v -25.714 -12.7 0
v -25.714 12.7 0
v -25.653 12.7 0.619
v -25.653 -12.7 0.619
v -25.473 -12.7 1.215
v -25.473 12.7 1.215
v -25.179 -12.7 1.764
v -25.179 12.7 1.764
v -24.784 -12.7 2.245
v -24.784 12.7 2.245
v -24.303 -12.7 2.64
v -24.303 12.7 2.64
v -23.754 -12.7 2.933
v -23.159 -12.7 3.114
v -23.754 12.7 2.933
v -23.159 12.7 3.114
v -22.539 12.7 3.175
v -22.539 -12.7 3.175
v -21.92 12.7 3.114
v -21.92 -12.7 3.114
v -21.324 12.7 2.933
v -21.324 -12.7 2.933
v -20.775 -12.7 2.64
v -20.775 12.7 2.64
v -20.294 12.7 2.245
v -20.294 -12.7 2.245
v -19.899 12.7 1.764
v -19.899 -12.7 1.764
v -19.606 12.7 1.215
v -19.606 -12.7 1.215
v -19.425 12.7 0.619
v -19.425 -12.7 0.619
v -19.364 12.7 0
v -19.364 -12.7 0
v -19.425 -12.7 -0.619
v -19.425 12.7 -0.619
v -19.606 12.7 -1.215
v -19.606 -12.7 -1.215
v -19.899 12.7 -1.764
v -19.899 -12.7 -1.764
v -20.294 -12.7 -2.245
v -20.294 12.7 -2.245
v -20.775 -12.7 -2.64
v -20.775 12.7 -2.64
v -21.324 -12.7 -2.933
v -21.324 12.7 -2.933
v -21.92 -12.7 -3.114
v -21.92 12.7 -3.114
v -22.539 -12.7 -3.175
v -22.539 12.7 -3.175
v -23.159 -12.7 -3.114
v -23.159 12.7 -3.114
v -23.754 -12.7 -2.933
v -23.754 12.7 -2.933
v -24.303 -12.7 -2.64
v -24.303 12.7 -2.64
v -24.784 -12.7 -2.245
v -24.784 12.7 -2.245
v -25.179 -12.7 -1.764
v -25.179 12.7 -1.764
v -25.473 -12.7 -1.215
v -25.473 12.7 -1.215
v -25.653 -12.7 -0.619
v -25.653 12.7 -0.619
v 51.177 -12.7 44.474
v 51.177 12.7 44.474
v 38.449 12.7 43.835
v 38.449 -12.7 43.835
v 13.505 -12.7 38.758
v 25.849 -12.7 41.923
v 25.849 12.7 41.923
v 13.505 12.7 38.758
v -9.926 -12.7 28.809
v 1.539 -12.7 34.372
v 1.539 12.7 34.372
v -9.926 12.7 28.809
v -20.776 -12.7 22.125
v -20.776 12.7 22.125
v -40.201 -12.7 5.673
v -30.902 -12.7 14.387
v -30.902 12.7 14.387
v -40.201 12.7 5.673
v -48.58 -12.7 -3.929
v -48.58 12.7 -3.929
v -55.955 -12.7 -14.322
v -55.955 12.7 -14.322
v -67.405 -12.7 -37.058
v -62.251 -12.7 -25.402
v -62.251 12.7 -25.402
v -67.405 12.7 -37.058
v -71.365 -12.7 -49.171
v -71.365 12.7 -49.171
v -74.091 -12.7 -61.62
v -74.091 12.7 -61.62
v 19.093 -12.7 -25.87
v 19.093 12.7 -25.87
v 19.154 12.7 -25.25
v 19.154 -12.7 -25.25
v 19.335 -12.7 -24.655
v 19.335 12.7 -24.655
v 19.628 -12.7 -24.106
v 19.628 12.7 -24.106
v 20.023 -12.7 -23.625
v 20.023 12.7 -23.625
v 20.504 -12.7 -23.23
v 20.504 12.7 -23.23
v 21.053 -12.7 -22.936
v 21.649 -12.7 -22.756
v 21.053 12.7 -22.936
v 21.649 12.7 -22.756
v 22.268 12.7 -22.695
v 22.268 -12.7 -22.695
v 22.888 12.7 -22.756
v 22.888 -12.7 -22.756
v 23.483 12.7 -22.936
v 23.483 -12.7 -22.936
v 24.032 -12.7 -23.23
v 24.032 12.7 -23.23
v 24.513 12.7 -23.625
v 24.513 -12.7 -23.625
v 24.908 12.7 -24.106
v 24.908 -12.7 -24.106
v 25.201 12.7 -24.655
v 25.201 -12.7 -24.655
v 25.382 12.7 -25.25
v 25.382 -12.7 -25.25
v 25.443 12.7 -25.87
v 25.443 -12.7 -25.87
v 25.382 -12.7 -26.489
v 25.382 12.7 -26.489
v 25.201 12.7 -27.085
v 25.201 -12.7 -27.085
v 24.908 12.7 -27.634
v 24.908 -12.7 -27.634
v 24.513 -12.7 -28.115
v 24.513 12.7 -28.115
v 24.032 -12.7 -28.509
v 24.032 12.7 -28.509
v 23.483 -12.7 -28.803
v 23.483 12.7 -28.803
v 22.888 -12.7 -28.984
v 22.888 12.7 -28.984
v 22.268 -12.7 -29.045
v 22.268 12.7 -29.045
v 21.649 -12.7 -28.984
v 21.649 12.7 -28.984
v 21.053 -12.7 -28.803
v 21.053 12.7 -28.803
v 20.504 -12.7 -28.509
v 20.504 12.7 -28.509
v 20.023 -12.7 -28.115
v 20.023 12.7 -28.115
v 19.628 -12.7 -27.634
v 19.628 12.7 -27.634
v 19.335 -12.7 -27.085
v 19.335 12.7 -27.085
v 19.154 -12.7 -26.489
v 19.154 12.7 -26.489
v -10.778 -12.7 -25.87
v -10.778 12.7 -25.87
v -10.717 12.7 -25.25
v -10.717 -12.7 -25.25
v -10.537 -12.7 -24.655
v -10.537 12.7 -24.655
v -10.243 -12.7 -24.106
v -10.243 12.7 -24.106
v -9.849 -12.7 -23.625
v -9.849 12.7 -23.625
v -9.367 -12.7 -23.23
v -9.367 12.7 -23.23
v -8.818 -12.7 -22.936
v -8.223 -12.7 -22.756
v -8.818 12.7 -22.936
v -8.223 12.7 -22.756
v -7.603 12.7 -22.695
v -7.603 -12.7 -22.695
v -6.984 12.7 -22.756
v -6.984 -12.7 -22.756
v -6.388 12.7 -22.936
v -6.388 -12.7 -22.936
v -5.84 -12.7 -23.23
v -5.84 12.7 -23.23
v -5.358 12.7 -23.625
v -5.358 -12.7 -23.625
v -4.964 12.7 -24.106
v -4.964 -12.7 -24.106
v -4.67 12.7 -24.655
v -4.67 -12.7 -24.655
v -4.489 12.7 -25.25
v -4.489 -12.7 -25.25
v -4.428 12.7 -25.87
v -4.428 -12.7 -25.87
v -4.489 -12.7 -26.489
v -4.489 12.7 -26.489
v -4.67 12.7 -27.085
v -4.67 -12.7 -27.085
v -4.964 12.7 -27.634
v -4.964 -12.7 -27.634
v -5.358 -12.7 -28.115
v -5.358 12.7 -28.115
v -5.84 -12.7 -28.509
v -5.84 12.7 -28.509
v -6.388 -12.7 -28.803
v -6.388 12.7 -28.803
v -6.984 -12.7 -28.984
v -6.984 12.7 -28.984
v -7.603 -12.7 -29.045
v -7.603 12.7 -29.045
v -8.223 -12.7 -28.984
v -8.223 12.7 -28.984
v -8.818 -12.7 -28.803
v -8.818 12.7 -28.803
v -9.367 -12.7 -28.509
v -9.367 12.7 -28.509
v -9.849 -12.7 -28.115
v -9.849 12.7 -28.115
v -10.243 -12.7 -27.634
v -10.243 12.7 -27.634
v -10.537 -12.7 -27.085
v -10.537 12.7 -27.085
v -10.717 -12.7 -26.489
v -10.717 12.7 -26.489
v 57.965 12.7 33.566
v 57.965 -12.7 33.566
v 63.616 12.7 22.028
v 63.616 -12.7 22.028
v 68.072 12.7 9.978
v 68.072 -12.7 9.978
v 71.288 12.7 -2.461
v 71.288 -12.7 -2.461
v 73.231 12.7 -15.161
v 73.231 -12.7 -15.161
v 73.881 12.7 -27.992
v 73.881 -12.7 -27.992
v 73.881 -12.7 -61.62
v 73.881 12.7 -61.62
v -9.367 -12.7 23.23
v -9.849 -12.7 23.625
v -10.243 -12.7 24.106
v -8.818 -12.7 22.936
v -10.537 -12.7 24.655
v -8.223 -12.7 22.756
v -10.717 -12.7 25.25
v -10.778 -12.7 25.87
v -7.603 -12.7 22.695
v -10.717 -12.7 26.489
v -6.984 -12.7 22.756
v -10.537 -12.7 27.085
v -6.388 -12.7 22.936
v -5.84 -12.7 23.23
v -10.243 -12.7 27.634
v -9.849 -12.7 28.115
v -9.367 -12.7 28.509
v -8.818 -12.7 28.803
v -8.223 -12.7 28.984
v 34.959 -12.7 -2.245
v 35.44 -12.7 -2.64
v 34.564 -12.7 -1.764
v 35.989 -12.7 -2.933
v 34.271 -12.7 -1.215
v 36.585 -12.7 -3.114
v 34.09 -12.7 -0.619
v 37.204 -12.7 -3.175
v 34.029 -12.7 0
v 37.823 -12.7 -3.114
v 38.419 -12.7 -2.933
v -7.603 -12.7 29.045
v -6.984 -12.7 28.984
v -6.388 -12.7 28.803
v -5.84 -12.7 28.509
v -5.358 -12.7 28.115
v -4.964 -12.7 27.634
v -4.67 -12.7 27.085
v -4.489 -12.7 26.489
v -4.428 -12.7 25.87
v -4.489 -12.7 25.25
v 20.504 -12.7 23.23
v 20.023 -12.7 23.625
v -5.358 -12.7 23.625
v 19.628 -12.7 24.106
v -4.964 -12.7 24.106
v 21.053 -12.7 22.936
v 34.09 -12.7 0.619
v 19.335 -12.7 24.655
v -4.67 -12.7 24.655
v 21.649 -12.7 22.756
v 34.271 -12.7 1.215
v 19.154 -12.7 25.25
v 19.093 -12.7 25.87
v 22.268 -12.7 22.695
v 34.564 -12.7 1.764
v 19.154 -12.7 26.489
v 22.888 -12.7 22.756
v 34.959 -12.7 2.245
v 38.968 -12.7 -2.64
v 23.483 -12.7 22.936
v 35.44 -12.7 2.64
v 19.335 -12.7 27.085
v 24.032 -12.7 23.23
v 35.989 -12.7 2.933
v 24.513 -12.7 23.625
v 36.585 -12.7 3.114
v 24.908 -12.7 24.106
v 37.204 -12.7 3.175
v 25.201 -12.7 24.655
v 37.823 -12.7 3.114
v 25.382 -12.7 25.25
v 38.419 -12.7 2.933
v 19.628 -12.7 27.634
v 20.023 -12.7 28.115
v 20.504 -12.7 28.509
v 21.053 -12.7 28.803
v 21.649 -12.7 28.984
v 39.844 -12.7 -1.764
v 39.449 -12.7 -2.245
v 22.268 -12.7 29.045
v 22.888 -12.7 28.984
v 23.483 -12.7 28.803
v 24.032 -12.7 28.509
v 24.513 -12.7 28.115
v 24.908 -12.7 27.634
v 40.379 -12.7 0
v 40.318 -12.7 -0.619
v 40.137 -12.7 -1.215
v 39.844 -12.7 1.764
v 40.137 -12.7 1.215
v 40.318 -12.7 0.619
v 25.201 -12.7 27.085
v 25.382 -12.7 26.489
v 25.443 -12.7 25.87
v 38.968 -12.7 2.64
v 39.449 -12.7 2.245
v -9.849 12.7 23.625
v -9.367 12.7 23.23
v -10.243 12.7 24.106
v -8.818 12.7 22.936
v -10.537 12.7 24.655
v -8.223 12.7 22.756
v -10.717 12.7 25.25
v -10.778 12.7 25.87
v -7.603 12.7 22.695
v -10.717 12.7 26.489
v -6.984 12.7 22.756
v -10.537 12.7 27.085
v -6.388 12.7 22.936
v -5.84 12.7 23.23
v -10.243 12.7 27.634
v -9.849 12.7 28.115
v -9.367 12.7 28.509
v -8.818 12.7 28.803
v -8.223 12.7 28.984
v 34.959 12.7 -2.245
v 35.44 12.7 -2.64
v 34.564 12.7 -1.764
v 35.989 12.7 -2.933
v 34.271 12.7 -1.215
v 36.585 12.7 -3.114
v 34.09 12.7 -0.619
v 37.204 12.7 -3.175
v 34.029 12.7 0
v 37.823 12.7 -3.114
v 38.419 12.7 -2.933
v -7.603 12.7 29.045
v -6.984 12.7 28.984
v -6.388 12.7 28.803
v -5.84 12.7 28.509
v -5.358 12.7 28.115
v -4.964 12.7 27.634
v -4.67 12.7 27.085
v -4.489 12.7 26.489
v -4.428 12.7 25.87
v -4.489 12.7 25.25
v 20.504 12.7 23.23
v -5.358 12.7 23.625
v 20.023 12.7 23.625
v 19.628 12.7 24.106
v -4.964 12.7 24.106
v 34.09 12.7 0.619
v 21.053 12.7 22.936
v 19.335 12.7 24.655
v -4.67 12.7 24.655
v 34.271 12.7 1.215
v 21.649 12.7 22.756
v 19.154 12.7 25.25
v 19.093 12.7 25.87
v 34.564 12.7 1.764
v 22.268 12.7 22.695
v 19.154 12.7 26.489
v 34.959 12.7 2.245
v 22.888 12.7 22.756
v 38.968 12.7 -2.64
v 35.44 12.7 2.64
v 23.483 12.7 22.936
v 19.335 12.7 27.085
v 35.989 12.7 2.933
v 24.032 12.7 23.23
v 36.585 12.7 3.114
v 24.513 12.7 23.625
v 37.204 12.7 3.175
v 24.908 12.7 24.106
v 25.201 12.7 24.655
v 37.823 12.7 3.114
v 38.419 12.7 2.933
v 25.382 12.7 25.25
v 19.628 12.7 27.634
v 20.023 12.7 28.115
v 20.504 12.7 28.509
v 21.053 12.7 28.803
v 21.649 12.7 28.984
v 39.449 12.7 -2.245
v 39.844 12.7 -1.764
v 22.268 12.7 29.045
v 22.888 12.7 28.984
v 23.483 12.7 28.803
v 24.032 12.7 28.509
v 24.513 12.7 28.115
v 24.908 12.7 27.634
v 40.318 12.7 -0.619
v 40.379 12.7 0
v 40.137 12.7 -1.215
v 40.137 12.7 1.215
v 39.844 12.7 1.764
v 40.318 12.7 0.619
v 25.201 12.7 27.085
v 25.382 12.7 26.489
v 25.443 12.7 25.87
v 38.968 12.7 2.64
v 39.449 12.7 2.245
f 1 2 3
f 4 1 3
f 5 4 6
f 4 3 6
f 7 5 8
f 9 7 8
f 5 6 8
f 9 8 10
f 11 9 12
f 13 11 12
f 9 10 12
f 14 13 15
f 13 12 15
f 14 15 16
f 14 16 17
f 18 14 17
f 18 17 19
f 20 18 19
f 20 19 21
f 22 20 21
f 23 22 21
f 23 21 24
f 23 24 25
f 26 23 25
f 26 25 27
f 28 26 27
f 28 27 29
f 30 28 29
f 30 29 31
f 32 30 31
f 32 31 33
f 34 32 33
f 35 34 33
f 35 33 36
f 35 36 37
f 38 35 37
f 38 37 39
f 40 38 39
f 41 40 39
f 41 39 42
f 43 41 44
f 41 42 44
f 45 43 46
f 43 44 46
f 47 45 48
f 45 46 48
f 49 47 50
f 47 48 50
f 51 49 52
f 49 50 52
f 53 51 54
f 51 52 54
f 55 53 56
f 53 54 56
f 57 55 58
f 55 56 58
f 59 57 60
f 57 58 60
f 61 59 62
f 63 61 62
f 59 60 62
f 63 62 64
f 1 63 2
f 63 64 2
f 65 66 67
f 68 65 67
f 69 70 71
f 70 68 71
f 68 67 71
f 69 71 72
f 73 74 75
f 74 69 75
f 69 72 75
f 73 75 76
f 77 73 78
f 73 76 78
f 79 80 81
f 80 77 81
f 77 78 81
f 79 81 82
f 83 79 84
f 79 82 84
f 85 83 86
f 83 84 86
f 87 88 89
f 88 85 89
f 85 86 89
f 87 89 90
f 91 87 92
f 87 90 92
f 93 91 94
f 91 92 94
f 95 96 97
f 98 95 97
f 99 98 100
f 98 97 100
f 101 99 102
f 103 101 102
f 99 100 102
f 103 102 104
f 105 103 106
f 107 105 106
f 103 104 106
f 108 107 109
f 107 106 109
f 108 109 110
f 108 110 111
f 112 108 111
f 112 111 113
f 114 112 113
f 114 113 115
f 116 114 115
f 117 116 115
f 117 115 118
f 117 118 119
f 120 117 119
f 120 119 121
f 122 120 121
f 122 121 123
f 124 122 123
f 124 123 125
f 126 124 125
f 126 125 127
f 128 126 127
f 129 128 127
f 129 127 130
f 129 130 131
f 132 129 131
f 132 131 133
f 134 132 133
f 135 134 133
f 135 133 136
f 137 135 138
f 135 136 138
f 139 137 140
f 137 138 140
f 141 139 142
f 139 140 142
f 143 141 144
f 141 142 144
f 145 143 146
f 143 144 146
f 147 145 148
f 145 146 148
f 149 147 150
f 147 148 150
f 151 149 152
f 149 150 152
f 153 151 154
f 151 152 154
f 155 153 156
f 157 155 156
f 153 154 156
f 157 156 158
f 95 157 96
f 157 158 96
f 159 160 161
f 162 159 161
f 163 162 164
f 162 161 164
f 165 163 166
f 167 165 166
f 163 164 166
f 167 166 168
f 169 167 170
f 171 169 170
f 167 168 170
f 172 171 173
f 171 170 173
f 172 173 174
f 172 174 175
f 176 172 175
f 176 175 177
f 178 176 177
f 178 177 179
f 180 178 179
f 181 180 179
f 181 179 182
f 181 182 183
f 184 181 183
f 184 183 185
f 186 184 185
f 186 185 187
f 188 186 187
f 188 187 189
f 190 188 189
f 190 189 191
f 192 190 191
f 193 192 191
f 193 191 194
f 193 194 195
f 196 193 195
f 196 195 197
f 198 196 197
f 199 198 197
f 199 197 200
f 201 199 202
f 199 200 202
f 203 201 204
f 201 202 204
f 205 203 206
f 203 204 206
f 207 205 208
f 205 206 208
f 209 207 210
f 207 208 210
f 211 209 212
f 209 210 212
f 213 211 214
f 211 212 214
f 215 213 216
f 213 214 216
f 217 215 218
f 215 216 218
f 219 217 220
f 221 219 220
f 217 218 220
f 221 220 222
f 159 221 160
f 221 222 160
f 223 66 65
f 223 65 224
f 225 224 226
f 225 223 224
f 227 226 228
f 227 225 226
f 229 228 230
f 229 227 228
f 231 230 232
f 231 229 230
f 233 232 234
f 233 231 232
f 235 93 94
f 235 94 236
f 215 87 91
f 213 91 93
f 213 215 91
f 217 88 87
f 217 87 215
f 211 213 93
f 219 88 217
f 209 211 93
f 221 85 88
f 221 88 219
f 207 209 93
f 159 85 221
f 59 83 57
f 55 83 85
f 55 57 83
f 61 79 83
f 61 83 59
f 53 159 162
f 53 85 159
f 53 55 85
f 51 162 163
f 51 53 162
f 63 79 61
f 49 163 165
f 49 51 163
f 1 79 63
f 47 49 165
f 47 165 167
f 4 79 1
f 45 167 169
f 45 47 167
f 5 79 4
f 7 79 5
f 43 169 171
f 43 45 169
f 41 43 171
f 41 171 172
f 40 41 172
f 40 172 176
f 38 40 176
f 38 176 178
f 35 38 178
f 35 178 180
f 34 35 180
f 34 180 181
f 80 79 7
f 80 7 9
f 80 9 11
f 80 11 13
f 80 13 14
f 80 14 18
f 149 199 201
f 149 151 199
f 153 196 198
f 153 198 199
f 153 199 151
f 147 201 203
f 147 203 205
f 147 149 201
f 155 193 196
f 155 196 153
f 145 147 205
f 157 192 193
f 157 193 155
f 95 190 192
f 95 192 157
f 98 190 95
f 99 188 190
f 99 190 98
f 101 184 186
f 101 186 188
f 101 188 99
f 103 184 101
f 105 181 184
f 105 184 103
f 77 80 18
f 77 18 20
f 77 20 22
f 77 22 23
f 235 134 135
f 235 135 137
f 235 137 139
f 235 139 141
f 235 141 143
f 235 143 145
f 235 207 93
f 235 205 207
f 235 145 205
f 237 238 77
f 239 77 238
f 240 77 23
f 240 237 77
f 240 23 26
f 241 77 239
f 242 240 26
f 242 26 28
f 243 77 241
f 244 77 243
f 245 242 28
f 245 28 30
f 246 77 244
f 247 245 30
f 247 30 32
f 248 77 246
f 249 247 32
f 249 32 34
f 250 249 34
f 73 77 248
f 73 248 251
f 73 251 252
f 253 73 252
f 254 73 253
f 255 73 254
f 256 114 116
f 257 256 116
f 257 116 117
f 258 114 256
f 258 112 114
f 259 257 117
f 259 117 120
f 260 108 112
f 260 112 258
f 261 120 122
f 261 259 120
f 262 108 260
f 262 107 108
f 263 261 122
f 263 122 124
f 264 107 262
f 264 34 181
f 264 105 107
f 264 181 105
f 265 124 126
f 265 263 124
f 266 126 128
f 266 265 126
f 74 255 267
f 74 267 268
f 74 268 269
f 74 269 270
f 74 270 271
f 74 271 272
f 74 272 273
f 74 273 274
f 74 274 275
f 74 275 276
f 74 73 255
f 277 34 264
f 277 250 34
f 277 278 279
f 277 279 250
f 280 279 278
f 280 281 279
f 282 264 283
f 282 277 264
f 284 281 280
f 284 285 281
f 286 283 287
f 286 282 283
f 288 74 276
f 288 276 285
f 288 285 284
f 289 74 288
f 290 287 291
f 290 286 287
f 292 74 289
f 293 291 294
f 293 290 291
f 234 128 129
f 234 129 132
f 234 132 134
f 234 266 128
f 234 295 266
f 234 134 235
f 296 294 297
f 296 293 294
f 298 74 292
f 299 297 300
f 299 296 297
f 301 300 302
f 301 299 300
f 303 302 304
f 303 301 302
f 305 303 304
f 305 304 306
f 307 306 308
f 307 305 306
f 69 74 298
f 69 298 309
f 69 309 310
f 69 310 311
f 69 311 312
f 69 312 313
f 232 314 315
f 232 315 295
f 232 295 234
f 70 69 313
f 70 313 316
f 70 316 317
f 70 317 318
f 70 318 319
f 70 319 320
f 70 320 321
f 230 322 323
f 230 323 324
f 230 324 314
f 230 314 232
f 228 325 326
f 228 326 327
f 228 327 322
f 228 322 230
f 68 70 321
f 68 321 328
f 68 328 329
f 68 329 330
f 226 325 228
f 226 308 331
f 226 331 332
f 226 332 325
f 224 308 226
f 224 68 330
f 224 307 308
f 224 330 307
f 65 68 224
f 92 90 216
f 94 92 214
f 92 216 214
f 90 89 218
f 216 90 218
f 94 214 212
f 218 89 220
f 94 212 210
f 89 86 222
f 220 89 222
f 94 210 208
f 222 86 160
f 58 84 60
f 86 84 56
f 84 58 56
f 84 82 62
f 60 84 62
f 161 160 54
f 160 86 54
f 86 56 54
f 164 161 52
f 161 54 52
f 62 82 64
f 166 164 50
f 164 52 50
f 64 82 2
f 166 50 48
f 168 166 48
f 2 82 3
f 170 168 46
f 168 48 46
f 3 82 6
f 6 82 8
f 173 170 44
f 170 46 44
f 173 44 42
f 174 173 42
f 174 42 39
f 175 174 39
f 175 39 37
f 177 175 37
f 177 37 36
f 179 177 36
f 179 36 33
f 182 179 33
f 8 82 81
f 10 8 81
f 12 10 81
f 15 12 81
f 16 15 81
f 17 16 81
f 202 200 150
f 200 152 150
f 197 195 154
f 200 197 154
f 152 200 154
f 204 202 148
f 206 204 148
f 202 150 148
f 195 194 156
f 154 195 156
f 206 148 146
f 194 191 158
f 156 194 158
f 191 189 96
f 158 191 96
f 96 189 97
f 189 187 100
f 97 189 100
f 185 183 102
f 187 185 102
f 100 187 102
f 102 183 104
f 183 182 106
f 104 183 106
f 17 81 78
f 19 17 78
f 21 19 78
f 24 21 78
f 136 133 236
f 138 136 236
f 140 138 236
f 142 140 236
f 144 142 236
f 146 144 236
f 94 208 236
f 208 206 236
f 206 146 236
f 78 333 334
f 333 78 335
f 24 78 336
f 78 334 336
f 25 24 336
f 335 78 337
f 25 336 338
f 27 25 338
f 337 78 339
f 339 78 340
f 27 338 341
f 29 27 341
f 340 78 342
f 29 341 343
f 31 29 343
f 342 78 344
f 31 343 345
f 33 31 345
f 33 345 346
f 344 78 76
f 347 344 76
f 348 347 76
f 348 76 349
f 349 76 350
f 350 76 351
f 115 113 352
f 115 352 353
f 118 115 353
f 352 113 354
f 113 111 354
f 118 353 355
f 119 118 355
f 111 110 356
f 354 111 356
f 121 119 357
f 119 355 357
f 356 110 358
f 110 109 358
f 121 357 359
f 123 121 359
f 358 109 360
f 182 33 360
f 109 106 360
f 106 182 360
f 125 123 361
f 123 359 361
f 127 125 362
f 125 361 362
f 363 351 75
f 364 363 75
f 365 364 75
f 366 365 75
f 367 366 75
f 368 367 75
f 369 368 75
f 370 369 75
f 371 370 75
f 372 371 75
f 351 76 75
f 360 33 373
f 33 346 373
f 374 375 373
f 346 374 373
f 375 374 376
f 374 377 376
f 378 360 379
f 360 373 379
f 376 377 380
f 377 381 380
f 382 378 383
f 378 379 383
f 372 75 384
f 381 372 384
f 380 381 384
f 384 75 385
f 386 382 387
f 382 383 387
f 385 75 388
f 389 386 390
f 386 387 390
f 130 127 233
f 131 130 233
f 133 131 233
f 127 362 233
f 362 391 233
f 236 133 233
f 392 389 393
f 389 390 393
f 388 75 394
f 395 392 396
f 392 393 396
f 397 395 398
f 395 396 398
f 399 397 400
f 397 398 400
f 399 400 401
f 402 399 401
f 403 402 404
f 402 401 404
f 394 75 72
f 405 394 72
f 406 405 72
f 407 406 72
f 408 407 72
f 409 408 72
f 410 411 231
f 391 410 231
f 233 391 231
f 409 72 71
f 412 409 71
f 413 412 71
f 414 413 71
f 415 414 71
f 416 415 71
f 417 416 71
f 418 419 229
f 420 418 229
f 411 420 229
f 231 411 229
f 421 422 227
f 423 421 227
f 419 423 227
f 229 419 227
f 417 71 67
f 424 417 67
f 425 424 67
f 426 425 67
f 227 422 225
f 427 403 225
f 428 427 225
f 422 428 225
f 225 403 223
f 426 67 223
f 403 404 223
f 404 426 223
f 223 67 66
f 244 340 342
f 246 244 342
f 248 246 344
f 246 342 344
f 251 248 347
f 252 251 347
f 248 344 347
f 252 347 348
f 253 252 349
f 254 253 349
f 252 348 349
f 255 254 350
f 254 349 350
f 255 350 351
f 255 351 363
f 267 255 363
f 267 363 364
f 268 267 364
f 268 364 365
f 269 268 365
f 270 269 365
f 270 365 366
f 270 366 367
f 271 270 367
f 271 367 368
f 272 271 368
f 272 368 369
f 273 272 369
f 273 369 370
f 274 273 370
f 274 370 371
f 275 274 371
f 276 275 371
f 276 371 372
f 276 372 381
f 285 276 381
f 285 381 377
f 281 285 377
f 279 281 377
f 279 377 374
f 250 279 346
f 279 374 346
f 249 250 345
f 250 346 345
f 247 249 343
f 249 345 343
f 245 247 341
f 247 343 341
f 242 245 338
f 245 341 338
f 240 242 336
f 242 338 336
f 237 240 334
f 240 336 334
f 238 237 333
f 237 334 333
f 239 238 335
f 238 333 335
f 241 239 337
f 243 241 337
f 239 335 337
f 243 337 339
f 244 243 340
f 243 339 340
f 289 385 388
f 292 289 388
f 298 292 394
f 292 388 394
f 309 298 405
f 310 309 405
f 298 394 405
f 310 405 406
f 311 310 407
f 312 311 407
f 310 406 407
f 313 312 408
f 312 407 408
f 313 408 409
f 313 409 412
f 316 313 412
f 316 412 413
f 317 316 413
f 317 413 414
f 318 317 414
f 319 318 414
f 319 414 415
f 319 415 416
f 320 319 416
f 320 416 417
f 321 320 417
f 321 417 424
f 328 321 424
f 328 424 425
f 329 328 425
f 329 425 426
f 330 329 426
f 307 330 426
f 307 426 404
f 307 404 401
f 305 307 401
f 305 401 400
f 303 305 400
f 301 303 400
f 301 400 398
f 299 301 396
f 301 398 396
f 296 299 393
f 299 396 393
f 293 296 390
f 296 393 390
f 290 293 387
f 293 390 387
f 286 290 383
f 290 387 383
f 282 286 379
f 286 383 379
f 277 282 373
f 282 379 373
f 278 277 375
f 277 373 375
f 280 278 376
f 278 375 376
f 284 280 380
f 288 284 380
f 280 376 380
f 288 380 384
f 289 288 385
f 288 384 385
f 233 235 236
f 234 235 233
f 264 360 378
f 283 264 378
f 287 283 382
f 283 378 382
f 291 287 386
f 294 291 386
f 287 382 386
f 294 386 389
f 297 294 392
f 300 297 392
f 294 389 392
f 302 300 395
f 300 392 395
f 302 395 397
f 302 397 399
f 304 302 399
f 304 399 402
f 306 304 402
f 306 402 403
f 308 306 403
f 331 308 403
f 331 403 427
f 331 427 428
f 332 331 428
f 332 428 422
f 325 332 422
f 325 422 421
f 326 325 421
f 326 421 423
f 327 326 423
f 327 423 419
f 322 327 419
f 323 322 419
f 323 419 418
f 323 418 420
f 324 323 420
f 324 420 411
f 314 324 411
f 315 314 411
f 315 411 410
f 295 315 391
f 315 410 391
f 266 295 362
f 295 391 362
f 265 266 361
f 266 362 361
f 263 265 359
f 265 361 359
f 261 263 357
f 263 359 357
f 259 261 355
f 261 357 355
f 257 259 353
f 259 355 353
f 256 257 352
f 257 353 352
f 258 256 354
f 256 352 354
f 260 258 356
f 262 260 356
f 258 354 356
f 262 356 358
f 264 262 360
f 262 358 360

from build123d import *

# Parameters (mm, degrees)
F0_W        = 147.9716226459
F0_H        = 106.0937568545
F1_DEPTH    = 12.7
F2_T1_DEPTH = 651.7371495757
F3_T1_DEPTH = 387.7321882623
F5_D        = 6.35


# Not quite as in the source:
# - a fillet or chamfer that OpenCascade refuses, or shapes differently, is made with other operations: its cross-section is extruded or revolved along the edge and cut away or added


with BuildPart() as f1:
    # F0 (on Front) → F1 (new body, symmetric)
    with BuildSketch(Plane.XZ):
        with Locations((-0.1046992838, -8.5726827383)):
            Rectangle(F0_W, F0_H)
    extrude(amount=F1_DEPTH, both=True)

    # F2: fillet of radius 127 on 1 edges, made by hand

    # F2_s2 → F2_t1 (cut)
    with BuildSketch(Plane.XZ.offset(-325.8685747878)):
        with BuildLine():
            ThreePointArc((51.1769193084, 44.474195689), (-30.9020278112, 14.386766802), (-74.0905106068, -61.6195611656))
            Line((-74.0905106068, -61.6195611656), (-74.0905106068, 44.474195689))
            Line((-74.0905106068, 44.474195689), (51.1769193084, 44.474195689))
        make_face()
    extrude(amount=F2_T1_DEPTH, mode=Mode.SUBTRACT)

    # F3: fillet of radius 127 on 1 edges, made by hand

    # F3_s2 → F3_t1 (cut)
    with BuildSketch(Plane.XZ.offset(-193.8660941311)):
        with BuildLine():
            ThreePointArc((51.1769193084, 44.474195689), (68.0722163397, 9.9776966511), (73.8811120391, -27.9922419635))
            Line((73.8811120391, -27.9922419635), (73.8811120391, 44.474195689))
            Line((73.8811120391, 44.474195689), (51.1769193084, 44.474195689))
        make_face()
    extrude(amount=F3_T1_DEPTH, mode=Mode.SUBTRACT)

    # F5 (through all)
    with Locations(Plane.XZ.offset(12.7)):
        with Locations((-7.6034513134, -25.8695669472), (-22.5392527542, 0), (-7.6034513134, 25.8695669472), (22.2681515682, 25.8695669472), (37.203953009, 0), (22.2681515682, -25.8695669472)):
            Hole(F5_D / 2)


solid = f1.part
